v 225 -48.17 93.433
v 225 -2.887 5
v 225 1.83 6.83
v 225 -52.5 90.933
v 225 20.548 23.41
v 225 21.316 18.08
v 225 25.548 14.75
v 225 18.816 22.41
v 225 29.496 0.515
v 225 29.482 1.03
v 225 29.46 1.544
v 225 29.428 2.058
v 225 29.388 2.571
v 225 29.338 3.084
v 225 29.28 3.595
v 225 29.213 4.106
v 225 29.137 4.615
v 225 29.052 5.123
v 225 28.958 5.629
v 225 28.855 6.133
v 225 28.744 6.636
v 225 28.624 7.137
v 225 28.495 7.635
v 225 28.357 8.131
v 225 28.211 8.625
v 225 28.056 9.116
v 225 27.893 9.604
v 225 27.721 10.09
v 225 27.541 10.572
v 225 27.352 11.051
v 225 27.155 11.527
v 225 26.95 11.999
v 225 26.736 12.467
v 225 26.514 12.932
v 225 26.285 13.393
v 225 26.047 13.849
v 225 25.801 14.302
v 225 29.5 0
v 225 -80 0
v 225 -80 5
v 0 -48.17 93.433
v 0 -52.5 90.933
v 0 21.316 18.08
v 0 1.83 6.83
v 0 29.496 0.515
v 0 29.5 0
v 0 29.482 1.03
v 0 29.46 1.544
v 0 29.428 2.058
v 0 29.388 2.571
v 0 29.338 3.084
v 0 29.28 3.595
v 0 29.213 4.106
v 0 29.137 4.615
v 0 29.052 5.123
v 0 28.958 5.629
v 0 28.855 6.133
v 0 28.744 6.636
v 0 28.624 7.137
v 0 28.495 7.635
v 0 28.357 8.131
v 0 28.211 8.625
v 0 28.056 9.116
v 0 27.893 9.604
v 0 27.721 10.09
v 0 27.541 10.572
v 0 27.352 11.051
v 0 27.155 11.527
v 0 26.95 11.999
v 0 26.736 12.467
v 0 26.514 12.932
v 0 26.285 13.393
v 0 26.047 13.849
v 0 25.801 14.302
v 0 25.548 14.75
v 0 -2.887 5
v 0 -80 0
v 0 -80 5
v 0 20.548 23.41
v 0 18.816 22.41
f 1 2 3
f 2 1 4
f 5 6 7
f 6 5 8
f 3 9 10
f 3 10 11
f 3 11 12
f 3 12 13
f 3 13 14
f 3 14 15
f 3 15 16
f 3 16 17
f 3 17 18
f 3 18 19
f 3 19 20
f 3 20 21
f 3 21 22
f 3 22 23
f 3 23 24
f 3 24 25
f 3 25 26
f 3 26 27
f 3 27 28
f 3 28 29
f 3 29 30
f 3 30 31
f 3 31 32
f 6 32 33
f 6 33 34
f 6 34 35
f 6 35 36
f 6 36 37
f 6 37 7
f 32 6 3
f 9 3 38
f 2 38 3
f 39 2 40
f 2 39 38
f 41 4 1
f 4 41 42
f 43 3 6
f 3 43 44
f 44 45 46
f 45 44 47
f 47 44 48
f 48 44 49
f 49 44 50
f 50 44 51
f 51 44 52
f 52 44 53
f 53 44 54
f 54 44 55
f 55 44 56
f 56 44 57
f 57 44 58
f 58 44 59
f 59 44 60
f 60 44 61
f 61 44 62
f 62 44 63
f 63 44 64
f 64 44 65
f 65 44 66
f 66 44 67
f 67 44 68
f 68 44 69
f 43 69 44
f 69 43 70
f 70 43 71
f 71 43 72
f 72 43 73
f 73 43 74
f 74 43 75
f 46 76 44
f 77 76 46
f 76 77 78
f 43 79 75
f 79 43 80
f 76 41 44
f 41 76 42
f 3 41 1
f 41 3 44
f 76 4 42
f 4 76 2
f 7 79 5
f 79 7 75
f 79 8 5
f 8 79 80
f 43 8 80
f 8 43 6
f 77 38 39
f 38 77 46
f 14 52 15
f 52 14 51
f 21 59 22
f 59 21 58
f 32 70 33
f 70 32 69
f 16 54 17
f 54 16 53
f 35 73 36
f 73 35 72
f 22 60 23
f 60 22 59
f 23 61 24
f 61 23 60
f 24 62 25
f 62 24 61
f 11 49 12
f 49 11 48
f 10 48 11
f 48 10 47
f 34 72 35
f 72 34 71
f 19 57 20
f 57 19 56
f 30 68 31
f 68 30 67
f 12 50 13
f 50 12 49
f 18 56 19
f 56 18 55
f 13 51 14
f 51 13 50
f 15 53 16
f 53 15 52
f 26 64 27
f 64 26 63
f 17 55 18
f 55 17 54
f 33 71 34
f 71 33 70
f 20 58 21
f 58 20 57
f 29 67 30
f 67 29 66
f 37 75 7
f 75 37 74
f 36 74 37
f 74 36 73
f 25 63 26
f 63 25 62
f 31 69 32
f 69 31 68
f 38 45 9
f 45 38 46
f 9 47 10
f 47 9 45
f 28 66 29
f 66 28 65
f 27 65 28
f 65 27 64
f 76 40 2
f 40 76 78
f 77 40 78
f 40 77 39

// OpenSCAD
// Render Control
$fa = 1;
$fs = 0.4;

/*
  Book Dimensions
    Width: ~150mm
    Depth: ~15mm
    Height: ~200mm

  Recline: 30 degrees

  *** Remember, the book will be approximately twice as wide when open! It will also be deeper! ***
*/

bookStandRatio = 1.5;

bookWidth = 150;
bookDepth = 15;
bookHeight = 200;

angle = 30;

baseDepth = 80;
baseThickness = 5;
baseWall = 2;

standWidth = bookStandRatio * bookWidth;
standDepth = bookStandRatio * bookDepth;

module stand() {
  rotate([angle,0,0]) {
    // Back
    translate ([0, 0, baseThickness]) {
      cube ([standWidth, baseThickness, bookHeight / 2]);
    }
    // Bottom
      cube ([standWidth, standDepth + baseWall + baseThickness, baseThickness]);
    // Front
    translate ([0, standDepth + baseThickness, baseThickness]) {
      cube ([standWidth, baseWall, baseThickness]);
    }
  }

  rotate ([90, 0, 90]) {
    rotate_extrude (angle = angle) {
      square ([standDepth + baseWall + baseThickness, standWidth]);
    }
  }

  translate ([0, -baseDepth, 0]) {
    cube ([standWidth, baseDepth, baseThickness]);
  }
}

render() {
  stand();
}

module holder(ARGS) {
  translate ([0, -baseThickness, 0]) {
    rotate(-angle, [1, 0, 0]) {
      cube([standWidth, baseThickness, bookHeight / 2]);

      translate([0, -standDepth, 0]) {
        cube([standWidth, standDepth + baseThickness, baseThickness]);
        cube([standWidth, baseWall, baseThickness * 2]);
      }
    }
  }

  translate([standWidth,0,0]) {
    rotate(-90, [0,0,1]) {
      rotate(90, [1,0,0]) {
        rotate_extrude(angle=angle, convexity = 10) {
          square(size = [standDepth + baseThickness, standWidth]);
        }
      }
    }
  }
}

module flat() {
  translate([0,-(standWidth / 2),-baseThickness]) {
    cube([standWidth, standWidth, baseThickness]);
  }
}
